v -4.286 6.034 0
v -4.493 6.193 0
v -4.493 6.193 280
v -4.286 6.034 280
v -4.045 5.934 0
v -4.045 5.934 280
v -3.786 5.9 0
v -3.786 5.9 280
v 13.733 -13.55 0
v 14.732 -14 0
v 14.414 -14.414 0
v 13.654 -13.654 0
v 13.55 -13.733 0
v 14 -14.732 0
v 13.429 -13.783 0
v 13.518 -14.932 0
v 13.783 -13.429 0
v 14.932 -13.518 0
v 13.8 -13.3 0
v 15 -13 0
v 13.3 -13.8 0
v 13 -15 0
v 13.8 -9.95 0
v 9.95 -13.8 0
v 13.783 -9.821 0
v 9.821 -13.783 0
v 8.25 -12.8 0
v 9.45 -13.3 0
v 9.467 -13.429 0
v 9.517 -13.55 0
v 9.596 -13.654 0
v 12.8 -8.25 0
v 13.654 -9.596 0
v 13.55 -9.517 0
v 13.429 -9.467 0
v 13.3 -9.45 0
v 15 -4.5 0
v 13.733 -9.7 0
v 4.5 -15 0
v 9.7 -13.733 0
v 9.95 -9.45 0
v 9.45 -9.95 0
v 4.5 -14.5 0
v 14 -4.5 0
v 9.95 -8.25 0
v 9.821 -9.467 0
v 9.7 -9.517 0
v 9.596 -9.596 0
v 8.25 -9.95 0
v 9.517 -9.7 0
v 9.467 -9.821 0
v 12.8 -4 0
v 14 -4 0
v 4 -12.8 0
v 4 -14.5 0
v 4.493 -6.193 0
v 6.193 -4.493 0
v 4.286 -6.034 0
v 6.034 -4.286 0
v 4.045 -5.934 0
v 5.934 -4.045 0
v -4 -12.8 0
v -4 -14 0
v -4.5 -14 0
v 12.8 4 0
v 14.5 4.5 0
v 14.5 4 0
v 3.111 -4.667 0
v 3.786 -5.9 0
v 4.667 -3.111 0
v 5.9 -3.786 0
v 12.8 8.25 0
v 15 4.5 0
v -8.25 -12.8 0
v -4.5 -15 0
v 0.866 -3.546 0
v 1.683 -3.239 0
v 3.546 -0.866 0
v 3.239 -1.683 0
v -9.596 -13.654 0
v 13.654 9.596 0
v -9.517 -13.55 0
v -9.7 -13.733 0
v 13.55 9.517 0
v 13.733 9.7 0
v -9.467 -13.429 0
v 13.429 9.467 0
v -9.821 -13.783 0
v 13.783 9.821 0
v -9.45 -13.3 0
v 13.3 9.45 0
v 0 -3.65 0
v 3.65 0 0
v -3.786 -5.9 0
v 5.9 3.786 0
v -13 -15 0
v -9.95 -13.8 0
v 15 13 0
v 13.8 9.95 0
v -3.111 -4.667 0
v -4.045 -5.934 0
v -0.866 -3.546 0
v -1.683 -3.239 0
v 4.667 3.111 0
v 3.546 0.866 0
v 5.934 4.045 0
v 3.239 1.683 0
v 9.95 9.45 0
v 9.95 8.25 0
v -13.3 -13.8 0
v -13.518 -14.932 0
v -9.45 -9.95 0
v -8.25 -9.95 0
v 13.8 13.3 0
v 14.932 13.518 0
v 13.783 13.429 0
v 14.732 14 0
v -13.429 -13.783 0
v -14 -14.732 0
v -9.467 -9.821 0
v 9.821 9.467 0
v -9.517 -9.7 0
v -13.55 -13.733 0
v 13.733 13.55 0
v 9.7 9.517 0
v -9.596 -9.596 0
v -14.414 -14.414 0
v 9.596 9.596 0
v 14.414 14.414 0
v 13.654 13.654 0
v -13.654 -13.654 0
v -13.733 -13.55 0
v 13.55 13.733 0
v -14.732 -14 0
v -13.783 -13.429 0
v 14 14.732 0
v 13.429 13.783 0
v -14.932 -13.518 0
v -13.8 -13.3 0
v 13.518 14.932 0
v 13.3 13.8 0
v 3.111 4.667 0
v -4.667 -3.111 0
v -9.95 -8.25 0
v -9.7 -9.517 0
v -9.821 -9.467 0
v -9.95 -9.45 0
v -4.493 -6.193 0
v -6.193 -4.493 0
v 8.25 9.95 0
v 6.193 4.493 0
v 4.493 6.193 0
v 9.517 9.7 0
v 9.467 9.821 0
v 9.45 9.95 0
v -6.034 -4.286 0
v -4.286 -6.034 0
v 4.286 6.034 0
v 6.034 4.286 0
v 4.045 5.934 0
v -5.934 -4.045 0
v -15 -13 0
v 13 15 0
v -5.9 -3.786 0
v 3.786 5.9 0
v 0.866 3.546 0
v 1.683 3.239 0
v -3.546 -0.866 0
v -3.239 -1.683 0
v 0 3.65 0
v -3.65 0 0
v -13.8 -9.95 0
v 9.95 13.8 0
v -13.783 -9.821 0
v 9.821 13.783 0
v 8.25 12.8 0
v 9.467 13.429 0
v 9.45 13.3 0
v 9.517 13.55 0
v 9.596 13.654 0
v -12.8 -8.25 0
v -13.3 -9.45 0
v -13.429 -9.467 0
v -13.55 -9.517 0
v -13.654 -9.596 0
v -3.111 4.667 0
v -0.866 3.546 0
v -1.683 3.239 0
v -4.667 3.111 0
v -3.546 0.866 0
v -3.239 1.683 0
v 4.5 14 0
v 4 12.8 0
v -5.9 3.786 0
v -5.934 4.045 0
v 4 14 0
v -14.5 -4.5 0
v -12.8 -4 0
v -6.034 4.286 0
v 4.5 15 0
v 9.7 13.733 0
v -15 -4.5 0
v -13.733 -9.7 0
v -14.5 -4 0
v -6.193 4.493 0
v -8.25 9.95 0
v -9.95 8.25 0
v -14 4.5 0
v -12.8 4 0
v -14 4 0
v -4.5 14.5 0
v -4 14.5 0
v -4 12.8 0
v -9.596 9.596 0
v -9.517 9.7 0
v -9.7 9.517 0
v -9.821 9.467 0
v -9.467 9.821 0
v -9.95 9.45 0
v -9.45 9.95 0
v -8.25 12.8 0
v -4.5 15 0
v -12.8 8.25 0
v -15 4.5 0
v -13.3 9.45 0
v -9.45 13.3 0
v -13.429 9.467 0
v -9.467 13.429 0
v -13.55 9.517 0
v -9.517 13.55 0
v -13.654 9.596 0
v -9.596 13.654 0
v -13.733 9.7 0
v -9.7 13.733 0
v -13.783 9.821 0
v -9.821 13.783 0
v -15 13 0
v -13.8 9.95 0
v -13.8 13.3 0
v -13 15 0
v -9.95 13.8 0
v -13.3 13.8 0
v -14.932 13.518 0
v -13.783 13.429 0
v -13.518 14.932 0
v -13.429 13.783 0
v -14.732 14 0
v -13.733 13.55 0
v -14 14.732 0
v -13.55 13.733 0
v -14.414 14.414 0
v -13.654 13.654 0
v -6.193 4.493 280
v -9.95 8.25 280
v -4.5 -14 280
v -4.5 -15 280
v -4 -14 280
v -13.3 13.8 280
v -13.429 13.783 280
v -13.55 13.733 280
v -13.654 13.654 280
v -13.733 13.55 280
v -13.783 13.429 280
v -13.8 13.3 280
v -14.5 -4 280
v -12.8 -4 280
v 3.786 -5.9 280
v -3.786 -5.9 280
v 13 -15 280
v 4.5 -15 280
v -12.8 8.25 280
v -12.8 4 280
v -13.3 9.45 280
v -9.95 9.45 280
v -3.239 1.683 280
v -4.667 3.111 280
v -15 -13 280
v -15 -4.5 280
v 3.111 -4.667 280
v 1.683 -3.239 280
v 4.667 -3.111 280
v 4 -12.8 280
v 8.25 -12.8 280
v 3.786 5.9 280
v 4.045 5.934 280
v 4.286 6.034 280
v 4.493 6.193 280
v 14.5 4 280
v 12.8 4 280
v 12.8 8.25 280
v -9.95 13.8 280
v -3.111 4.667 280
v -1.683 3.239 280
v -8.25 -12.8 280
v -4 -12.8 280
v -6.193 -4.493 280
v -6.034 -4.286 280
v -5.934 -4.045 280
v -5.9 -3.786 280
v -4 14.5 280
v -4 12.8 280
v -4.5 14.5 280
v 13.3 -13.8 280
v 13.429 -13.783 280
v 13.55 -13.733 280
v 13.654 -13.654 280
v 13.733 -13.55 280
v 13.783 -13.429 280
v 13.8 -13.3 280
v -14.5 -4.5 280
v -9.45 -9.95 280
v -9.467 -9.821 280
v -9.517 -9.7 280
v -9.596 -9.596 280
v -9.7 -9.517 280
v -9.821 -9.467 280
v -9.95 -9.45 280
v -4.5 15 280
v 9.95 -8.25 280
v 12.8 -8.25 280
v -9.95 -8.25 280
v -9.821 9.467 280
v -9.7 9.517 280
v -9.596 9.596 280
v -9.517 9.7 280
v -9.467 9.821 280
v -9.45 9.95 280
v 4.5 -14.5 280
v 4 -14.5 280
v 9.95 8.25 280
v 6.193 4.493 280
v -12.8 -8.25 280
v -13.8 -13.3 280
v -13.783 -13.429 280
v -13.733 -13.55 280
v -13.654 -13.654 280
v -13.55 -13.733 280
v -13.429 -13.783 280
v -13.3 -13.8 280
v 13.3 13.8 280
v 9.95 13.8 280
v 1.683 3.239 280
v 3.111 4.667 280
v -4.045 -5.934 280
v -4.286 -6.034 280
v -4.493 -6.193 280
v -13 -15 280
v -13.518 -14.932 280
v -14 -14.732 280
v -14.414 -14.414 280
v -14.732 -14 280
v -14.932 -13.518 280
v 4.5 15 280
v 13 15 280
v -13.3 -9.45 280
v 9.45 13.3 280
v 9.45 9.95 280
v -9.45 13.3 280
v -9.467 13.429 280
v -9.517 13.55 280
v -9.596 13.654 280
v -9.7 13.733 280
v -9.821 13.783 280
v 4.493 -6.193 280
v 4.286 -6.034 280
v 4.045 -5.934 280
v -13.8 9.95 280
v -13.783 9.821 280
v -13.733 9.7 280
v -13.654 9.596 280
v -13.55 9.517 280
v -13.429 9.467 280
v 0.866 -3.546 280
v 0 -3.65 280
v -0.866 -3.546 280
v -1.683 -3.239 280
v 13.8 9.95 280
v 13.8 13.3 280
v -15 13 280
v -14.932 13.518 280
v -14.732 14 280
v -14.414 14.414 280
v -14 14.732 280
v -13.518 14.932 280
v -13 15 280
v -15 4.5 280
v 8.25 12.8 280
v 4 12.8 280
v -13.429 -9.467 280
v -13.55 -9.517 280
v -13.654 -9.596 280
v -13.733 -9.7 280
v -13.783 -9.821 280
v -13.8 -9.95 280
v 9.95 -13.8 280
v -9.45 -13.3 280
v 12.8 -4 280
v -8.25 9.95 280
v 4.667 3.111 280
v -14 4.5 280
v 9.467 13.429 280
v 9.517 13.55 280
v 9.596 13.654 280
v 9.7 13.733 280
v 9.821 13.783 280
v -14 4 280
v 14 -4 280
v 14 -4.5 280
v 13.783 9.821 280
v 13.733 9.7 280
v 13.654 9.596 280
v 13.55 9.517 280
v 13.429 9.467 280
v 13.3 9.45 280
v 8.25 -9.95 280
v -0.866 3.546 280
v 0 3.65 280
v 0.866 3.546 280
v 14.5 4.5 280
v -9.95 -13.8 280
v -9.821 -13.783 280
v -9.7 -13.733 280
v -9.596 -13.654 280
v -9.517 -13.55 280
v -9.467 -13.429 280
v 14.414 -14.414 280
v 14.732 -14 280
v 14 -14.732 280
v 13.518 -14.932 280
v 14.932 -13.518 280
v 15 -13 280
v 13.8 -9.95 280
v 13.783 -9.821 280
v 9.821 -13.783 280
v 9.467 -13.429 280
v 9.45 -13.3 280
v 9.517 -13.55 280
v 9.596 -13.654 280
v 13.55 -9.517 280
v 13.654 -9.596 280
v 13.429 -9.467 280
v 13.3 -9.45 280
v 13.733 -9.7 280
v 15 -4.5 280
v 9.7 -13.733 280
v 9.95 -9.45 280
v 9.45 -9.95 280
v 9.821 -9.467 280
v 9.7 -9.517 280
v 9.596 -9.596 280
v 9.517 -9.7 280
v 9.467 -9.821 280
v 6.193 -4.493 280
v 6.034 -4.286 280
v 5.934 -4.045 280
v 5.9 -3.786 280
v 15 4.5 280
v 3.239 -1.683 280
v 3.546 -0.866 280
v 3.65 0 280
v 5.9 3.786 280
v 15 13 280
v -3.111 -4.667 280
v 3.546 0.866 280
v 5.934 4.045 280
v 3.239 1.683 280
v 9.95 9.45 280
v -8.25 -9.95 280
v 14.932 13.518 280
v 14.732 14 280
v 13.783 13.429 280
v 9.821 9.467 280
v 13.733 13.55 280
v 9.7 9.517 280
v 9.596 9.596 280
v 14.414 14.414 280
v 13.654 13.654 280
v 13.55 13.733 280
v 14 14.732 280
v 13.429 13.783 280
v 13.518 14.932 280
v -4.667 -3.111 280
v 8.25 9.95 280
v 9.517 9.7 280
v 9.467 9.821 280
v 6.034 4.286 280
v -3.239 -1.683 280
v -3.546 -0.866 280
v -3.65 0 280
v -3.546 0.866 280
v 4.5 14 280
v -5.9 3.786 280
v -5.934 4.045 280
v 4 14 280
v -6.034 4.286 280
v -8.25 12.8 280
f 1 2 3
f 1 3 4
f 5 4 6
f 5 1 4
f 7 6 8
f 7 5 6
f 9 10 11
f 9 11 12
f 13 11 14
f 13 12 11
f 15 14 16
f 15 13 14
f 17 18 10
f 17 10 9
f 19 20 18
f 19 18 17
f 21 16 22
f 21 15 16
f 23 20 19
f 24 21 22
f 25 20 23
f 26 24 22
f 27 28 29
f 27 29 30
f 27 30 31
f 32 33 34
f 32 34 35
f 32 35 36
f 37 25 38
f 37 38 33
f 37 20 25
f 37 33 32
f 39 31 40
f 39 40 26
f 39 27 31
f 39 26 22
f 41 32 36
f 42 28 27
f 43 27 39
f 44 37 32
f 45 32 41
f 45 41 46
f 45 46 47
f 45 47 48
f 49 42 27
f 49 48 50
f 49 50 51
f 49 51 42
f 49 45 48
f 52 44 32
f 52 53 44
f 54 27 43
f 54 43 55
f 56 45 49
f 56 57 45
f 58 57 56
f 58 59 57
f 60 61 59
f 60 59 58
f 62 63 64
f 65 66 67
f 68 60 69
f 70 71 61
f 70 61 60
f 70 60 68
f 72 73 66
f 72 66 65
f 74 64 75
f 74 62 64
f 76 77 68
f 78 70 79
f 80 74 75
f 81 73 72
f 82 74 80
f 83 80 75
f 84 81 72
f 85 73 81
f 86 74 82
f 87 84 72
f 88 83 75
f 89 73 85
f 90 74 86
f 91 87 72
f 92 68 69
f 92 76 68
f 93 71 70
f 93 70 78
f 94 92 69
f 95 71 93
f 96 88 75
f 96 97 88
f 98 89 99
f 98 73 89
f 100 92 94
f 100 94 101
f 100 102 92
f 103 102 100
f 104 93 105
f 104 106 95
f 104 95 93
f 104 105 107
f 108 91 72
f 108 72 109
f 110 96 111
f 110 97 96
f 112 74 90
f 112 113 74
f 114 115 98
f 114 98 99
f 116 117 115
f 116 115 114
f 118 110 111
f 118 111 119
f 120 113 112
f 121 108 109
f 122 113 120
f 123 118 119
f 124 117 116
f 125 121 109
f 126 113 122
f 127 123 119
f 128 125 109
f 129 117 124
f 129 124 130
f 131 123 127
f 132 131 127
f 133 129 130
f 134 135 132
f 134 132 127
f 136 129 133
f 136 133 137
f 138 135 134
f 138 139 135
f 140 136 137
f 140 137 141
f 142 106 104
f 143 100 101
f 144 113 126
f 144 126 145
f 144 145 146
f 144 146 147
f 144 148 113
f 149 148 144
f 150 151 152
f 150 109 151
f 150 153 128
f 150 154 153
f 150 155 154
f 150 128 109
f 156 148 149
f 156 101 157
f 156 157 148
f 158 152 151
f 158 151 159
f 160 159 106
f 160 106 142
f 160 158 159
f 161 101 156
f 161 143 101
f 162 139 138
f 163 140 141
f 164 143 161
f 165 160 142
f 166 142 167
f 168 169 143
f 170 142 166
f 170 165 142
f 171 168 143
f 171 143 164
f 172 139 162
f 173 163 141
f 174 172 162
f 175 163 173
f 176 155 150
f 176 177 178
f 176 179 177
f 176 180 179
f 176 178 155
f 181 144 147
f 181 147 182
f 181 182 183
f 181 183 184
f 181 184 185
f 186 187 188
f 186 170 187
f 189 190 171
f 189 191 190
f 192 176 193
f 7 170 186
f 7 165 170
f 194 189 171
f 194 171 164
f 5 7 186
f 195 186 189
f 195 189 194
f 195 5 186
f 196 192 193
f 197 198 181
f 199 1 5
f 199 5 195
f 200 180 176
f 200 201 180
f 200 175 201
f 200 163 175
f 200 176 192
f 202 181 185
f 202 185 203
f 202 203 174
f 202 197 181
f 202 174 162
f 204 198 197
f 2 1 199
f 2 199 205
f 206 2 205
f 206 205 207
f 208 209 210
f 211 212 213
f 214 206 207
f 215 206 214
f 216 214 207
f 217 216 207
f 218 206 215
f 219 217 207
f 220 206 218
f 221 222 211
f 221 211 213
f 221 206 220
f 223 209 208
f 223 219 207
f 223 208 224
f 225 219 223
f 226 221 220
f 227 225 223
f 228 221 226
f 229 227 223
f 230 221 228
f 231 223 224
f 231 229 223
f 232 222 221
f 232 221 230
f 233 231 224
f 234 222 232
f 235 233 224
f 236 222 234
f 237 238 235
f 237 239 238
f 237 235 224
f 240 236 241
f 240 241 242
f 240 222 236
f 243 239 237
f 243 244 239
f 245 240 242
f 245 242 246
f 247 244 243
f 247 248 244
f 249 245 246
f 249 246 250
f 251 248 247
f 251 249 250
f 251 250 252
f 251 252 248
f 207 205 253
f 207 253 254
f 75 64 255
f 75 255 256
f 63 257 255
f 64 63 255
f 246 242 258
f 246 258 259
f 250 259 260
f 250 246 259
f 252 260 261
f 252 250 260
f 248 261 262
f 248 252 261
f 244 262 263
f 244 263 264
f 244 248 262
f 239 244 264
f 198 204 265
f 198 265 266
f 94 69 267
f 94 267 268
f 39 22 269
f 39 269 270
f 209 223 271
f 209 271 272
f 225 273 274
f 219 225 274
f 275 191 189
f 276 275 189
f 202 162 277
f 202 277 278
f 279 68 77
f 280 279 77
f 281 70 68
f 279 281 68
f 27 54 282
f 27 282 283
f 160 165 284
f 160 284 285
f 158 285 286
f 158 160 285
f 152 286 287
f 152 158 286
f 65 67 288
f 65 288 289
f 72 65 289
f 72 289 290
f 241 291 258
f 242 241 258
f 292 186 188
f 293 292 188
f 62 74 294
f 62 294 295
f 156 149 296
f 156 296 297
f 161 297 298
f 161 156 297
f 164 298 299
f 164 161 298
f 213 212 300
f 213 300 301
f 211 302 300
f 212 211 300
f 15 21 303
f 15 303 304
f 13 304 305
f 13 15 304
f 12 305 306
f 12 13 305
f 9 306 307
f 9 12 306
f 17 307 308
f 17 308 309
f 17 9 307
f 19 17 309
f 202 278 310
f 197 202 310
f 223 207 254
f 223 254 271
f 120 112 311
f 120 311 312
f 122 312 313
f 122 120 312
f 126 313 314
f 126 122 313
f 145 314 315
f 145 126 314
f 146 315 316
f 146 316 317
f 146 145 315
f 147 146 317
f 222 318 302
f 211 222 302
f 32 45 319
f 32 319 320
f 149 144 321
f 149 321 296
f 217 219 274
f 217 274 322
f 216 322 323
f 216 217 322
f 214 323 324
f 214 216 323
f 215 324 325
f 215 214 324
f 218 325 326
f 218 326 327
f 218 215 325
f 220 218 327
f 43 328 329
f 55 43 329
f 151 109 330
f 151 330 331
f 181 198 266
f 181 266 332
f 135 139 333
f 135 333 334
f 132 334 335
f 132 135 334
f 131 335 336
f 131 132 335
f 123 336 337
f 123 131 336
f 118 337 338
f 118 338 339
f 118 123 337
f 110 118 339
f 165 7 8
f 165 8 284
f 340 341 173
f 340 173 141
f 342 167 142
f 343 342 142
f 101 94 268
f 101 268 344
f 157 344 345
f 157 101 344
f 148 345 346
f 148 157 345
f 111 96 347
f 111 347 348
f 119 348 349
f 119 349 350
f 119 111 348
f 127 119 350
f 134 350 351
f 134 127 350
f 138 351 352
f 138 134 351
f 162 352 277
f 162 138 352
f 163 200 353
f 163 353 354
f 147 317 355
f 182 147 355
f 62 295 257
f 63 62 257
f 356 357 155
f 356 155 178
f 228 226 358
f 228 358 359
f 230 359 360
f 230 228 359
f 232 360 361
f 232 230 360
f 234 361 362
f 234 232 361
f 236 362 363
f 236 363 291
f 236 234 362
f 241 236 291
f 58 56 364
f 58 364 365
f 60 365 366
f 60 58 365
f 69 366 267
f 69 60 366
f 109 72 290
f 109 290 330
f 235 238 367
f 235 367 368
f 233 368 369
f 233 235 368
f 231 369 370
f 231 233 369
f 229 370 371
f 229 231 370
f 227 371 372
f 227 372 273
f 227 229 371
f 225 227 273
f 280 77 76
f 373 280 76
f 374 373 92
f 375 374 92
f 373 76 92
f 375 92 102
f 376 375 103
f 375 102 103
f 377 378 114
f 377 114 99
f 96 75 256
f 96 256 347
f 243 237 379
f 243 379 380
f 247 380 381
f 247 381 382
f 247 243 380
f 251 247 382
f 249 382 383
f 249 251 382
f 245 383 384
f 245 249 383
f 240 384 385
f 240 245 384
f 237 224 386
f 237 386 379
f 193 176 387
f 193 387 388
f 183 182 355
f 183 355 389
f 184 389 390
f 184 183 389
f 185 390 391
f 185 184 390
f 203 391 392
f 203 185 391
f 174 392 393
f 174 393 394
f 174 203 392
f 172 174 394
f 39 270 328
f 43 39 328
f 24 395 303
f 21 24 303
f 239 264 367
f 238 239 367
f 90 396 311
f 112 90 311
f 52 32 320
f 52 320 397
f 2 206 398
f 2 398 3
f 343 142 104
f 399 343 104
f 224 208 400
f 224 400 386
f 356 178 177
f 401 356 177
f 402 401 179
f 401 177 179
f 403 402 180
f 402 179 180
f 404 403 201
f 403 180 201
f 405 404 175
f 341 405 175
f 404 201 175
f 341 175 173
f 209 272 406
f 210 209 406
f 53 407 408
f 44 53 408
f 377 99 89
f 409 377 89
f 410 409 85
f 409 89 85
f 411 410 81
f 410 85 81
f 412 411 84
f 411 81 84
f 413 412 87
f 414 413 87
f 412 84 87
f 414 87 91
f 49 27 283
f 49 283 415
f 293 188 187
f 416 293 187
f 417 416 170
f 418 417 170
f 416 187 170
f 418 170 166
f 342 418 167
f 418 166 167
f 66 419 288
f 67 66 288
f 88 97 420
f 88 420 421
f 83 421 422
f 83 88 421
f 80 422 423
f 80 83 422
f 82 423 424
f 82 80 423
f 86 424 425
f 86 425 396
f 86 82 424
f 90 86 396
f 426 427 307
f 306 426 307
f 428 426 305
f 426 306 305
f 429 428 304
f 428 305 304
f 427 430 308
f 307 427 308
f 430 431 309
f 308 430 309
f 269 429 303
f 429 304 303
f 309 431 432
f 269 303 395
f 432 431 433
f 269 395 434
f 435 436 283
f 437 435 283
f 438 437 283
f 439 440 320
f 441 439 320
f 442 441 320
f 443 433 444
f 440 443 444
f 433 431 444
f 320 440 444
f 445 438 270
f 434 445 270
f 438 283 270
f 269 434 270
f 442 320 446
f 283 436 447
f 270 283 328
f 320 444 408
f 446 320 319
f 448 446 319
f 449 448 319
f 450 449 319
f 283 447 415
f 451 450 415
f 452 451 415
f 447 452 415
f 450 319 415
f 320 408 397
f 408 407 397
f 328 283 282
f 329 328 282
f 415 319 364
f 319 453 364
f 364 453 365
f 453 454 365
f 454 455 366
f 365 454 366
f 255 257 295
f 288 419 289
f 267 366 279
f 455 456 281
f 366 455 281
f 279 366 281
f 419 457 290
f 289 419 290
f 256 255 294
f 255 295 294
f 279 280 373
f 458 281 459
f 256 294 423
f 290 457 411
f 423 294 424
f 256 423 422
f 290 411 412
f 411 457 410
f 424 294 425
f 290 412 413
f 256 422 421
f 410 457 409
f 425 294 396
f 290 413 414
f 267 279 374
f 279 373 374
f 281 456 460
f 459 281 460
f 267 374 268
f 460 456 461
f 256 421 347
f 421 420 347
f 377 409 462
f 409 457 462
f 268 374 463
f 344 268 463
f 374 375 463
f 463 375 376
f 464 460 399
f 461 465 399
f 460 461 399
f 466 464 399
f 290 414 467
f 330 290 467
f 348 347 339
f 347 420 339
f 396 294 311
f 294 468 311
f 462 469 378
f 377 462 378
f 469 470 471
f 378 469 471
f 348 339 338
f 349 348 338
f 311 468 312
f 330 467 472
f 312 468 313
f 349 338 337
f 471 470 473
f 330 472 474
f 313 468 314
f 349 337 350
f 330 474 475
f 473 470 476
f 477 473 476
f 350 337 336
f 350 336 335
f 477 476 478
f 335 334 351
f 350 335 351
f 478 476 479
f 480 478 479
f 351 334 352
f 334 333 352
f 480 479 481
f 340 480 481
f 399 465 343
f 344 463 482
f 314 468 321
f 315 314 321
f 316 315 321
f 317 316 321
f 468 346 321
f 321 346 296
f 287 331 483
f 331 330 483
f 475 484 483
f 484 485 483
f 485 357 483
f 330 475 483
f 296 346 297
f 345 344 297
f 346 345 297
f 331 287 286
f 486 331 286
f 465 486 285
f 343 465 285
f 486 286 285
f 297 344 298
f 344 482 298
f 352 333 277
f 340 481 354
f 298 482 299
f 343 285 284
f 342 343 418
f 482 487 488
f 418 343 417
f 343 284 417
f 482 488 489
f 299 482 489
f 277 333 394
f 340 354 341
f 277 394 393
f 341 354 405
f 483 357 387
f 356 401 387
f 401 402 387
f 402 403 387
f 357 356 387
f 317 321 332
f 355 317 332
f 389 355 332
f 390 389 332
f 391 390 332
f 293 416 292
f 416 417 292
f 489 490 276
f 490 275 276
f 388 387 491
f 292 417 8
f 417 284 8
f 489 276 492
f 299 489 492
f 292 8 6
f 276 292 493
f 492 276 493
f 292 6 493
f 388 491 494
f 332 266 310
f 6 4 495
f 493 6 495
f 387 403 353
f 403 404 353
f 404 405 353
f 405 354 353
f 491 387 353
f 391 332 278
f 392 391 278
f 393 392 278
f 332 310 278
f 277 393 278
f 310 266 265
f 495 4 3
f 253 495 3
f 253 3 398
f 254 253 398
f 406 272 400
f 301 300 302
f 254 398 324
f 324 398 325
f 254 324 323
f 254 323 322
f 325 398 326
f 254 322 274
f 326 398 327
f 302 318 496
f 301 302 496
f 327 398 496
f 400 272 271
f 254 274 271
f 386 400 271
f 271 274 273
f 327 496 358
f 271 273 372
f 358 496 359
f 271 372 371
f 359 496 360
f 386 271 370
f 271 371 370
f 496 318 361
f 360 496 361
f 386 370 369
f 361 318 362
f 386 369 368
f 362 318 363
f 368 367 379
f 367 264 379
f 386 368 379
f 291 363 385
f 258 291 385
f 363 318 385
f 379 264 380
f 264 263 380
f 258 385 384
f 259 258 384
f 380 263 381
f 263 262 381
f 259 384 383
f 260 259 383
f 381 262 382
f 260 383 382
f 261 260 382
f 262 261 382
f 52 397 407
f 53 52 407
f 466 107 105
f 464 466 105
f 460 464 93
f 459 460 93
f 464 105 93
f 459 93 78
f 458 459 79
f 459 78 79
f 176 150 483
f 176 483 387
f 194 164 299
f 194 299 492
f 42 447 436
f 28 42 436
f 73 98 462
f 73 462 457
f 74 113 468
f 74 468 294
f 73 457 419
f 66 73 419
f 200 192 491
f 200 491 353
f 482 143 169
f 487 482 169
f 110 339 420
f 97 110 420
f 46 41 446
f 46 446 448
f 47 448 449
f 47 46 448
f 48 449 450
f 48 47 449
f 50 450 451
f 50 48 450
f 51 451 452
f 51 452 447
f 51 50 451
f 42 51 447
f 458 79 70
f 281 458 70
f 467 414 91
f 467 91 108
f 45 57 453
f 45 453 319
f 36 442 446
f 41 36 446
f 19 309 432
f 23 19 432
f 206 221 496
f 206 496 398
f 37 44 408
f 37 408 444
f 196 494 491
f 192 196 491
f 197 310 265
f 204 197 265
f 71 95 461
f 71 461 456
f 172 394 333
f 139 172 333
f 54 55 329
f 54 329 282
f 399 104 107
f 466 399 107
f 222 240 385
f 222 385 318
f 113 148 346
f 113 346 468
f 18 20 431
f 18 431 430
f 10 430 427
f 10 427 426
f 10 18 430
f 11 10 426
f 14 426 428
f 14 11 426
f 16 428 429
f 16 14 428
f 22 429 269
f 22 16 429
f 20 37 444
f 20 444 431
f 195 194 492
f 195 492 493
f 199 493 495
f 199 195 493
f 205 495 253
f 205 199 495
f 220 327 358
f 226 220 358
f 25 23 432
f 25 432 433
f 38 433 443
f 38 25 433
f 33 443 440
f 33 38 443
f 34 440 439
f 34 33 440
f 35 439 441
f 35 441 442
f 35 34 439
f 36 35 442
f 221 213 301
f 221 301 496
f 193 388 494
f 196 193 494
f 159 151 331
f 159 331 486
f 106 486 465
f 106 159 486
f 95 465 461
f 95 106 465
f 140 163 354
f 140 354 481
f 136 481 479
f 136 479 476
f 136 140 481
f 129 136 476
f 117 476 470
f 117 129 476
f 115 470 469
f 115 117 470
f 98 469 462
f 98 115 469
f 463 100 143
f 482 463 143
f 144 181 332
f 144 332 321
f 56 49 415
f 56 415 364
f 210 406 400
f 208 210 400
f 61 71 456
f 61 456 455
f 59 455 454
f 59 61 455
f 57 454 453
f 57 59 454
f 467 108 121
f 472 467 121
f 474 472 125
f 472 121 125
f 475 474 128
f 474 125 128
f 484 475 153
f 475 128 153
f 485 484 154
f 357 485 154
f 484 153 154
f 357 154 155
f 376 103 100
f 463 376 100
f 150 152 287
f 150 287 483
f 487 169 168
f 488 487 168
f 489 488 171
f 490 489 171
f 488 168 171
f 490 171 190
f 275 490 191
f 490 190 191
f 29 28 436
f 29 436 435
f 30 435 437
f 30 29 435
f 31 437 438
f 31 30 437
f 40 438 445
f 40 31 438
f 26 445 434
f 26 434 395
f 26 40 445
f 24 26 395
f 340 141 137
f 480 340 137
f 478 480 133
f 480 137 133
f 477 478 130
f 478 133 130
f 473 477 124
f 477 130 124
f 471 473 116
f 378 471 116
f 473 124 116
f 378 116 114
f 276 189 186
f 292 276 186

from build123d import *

# Parameters (mm, degrees)
BOSS_EXTRUDE1_DEPTH = 280


with BuildPart() as part:
    # Sketch1 → Boss-Extrude1 (new body)
    with BuildSketch(Plane.XY):
        with BuildLine():
            Line((-4.5, 14.5), (-4.5, 15))
            Line((-4.5, 15), (-13, 15))
            ThreePointArc((-13, 15), (-14.414213562, 14.414213562), (-15, 13))
            Line((-15, 13), (-15, 4.5))
            Line((-15, 4.5), (-14, 4.5))
            Line((-14, 4.5), (-14, 4))
            Line((-14, 4), (-12.8, 4))
            Line((-12.8, 4), (-12.8, 8.25))
            Line((-12.8, 8.25), (-9.95, 8.25))
            Line((-9.95, 8.25), (-6.192893219, 4.492893219))
            ThreePointArc((-6.192893219, 4.492893219), (-5.976120467, 4.16846987), (-5.9, 3.785786438))
            Line((-5.9, 3.785786438), (-5.9, -3.785786438))
            ThreePointArc((-5.9, -3.785786438), (-5.976120467, -4.16846987), (-6.192893219, -4.492893219))
            Line((-6.192893219, -4.492893219), (-9.95, -8.25))
            Line((-9.95, -8.25), (-12.8, -8.25))
            Line((-12.8, -8.25), (-12.8, -4))
            Line((-12.8, -4), (-14.5, -4))
            Line((-14.5, -4), (-14.5, -4.5))
            Line((-14.5, -4.5), (-15, -4.5))
            Line((-15, -4.5), (-15, -13))
            ThreePointArc((-15, -13), (-14.414213562, -14.414213562), (-13, -15))
            Line((-13, -15), (-4.5, -15))
            Line((-4.5, -15), (-4.5, -14))
            Line((-4.5, -14), (-4, -14))
            Line((-4, -14), (-4, -12.8))
            Line((-4, -12.8), (-8.25, -12.8))
            Line((-8.25, -12.8), (-8.25, -9.95))
            Line((-8.25, -9.95), (-4.492893219, -6.192893219))
            ThreePointArc((-4.492893219, -6.192893219), (-4.16846987, -5.976120467), (-3.785786438, -5.9))
            Line((-3.785786438, -5.9), (3.785786438, -5.9))
            ThreePointArc((3.785786438, -5.9), (4.16846987, -5.976120467), (4.492893219, -6.192893219))
            Line((4.492893219, -6.192893219), (8.25, -9.95))
            Line((8.25, -9.95), (8.25, -12.8))
            Line((8.25, -12.8), (4, -12.8))
            Line((4, -12.8), (4, -14.5))
            Line((4, -14.5), (4.5, -14.5))
            Line((4.5, -14.5), (4.5, -15))
            Line((4.5, -15), (13, -15))
            ThreePointArc((13, -15), (14.414213562, -14.414213562), (15, -13))
            Line((15, -13), (15, -4.5))
            Line((15, -4.5), (14, -4.5))
            Line((14, -4.5), (14, -4))
            Line((14, -4), (12.8, -4))
            Line((12.8, -4), (12.8, -8.25))
            Line((12.8, -8.25), (9.95, -8.25))
            Line((9.95, -8.25), (6.192893219, -4.492893219))
            ThreePointArc((6.192893219, -4.492893219), (5.976120467, -4.16846987), (5.9, -3.785786438))
            Line((5.9, -3.785786438), (5.9, 3.785786438))
            ThreePointArc((5.9, 3.785786438), (5.976120467, 4.16846987), (6.192893219, 4.492893219))
            Line((6.192893219, 4.492893219), (9.95, 8.25))
            Line((9.95, 8.25), (12.8, 8.25))
            Line((12.8, 8.25), (12.8, 4))
            Line((12.8, 4), (14.5, 4))
            Line((14.5, 4), (14.5, 4.5))
            Line((14.5, 4.5), (15, 4.5))
            Line((15, 4.5), (15, 13))
            ThreePointArc((15, 13), (14.414213562, 14.414213562), (13, 15))
            Line((13, 15), (4.5, 15))
            Line((4.5, 15), (4.5, 14))
            Line((4.5, 14), (4, 14))
            Line((4, 14), (4, 12.8))
            Line((4, 12.8), (8.25, 12.8))
            Line((8.25, 12.8), (8.25, 9.95))
            Line((8.25, 9.95), (4.492893219, 6.192893219))
            ThreePointArc((4.492893219, 6.192893219), (4.16846987, 5.976120467), (3.785786438, 5.9))
            Line((3.785786438, 5.9), (-3.785786438, 5.9))
            ThreePointArc((-3.785786438, 5.9), (-4.16846987, 5.976120467), (-4.492893219, 6.192893219))
            Line((-4.492893219, 6.192893219), (-8.25, 9.95))
            Line((-8.25, 9.95), (-8.25, 12.8))
            Line((-8.25, 12.8), (-4, 12.8))
            Line((-4, 12.8), (-4, 14.5))
            Line((-4, 14.5), (-4.5, 14.5))
        make_face()
        with BuildLine():
            Line((-9.45, -9.95), (-9.45, -13.3))
            ThreePointArc((-9.45, -13.3), (-9.596446609, -13.653553391), (-9.95, -13.8))
            Line((-9.95, -13.8), (-13.3, -13.8))
            ThreePointArc((-13.3, -13.8), (-13.653553391, -13.653553391), (-13.8, -13.3))
            Line((-13.8, -13.3), (-13.8, -9.95))
            ThreePointArc((-13.8, -9.95), (-13.653553391, -9.596446609), (-13.3, -9.45))
            Line((-13.3, -9.45), (-9.95, -9.45))
            ThreePointArc((-9.95, -9.45), (-9.596446609, -9.596446609), (-9.45, -9.95))
        make_face(mode=Mode.SUBTRACT)
        with BuildLine():
            Line((9.95, -9.45), (13.3, -9.45))
            ThreePointArc((13.3, -9.45), (13.653553391, -9.596446609), (13.8, -9.95))
            Line((13.8, -9.95), (13.8, -13.3))
            ThreePointArc((13.8, -13.3), (13.653553391, -13.653553391), (13.3, -13.8))
            Line((13.3, -13.8), (9.95, -13.8))
            ThreePointArc((9.95, -13.8), (9.596446609, -13.653553391), (9.45, -13.3))
            Line((9.45, -13.3), (9.45, -9.95))
            ThreePointArc((9.45, -9.95), (9.596446609, -9.596446609), (9.95, -9.45))
        make_face(mode=Mode.SUBTRACT)
        with BuildLine():
            Line((-9.95, 9.45), (-13.3, 9.45))
            ThreePointArc((-13.3, 9.45), (-13.653553391, 9.596446609), (-13.8, 9.95))
            Line((-13.8, 9.95), (-13.8, 13.3))
            ThreePointArc((-13.8, 13.3), (-13.653553391, 13.653553391), (-13.3, 13.8))
            Line((-13.3, 13.8), (-9.95, 13.8))
            ThreePointArc((-9.95, 13.8), (-9.596446609, 13.653553391), (-9.45, 13.3))
            Line((-9.45, 13.3), (-9.45, 9.95))
            ThreePointArc((-9.45, 9.95), (-9.596446609, 9.596446609), (-9.95, 9.45))
        make_face(mode=Mode.SUBTRACT)
        with BuildLine():
            ThreePointArc((1.683127481, -3.2387624), (0, -3.65), (-1.683127481, -3.2387624))
            Line((-1.683127481, -3.2387624), (-3.111269837, -4.666904756))
            Line((-3.111269837, -4.666904756), (-4.666904756, -3.111269837))
            Line((-4.666904756, -3.111269837), (-3.2387624, -1.683127481))
            ThreePointArc((-3.2387624, -1.683127481), (-3.65, 0), (-3.2387624, 1.683127481))
            Line((-3.2387624, 1.683127481), (-4.666904756, 3.111269837))
            Line((-4.666904756, 3.111269837), (-3.111269837, 4.666904756))
            Line((-3.111269837, 4.666904756), (-1.683127481, 3.2387624))
            ThreePointArc((-1.683127481, 3.2387624), (0, 3.65), (1.683127481, 3.2387624))
            Line((1.683127481, 3.2387624), (3.111269837, 4.666904756))
            Line((3.111269837, 4.666904756), (4.666904756, 3.111269837))
            Line((4.666904756, 3.111269837), (3.2387624, 1.683127481))
            ThreePointArc((3.2387624, 1.683127481), (3.65, 0), (3.2387624, -1.683127481))
            Line((3.2387624, -1.683127481), (4.666904756, -3.111269837))
            Line((4.666904756, -3.111269837), (3.111269837, -4.666904756))
            Line((3.111269837, -4.666904756), (1.683127481, -3.2387624))
        make_face(mode=Mode.SUBTRACT)
        with BuildLine():
            ThreePointArc((9.45, 13.3), (9.596446609, 13.653553391), (9.95, 13.8))
            Line((9.95, 13.8), (13.3, 13.8))
            ThreePointArc((13.3, 13.8), (13.653553391, 13.653553391), (13.8, 13.3))
            Line((13.8, 13.3), (13.8, 9.95))
            ThreePointArc((13.8, 9.95), (13.653553391, 9.596446609), (13.3, 9.45))
            Line((13.3, 9.45), (9.95, 9.45))
            ThreePointArc((9.95, 9.45), (9.596446609, 9.596446609), (9.45, 9.95))
            Line((9.45, 9.95), (9.45, 13.3))
        make_face(mode=Mode.SUBTRACT)
    extrude(amount=BOSS_EXTRUDE1_DEPTH)


solid = part.part
